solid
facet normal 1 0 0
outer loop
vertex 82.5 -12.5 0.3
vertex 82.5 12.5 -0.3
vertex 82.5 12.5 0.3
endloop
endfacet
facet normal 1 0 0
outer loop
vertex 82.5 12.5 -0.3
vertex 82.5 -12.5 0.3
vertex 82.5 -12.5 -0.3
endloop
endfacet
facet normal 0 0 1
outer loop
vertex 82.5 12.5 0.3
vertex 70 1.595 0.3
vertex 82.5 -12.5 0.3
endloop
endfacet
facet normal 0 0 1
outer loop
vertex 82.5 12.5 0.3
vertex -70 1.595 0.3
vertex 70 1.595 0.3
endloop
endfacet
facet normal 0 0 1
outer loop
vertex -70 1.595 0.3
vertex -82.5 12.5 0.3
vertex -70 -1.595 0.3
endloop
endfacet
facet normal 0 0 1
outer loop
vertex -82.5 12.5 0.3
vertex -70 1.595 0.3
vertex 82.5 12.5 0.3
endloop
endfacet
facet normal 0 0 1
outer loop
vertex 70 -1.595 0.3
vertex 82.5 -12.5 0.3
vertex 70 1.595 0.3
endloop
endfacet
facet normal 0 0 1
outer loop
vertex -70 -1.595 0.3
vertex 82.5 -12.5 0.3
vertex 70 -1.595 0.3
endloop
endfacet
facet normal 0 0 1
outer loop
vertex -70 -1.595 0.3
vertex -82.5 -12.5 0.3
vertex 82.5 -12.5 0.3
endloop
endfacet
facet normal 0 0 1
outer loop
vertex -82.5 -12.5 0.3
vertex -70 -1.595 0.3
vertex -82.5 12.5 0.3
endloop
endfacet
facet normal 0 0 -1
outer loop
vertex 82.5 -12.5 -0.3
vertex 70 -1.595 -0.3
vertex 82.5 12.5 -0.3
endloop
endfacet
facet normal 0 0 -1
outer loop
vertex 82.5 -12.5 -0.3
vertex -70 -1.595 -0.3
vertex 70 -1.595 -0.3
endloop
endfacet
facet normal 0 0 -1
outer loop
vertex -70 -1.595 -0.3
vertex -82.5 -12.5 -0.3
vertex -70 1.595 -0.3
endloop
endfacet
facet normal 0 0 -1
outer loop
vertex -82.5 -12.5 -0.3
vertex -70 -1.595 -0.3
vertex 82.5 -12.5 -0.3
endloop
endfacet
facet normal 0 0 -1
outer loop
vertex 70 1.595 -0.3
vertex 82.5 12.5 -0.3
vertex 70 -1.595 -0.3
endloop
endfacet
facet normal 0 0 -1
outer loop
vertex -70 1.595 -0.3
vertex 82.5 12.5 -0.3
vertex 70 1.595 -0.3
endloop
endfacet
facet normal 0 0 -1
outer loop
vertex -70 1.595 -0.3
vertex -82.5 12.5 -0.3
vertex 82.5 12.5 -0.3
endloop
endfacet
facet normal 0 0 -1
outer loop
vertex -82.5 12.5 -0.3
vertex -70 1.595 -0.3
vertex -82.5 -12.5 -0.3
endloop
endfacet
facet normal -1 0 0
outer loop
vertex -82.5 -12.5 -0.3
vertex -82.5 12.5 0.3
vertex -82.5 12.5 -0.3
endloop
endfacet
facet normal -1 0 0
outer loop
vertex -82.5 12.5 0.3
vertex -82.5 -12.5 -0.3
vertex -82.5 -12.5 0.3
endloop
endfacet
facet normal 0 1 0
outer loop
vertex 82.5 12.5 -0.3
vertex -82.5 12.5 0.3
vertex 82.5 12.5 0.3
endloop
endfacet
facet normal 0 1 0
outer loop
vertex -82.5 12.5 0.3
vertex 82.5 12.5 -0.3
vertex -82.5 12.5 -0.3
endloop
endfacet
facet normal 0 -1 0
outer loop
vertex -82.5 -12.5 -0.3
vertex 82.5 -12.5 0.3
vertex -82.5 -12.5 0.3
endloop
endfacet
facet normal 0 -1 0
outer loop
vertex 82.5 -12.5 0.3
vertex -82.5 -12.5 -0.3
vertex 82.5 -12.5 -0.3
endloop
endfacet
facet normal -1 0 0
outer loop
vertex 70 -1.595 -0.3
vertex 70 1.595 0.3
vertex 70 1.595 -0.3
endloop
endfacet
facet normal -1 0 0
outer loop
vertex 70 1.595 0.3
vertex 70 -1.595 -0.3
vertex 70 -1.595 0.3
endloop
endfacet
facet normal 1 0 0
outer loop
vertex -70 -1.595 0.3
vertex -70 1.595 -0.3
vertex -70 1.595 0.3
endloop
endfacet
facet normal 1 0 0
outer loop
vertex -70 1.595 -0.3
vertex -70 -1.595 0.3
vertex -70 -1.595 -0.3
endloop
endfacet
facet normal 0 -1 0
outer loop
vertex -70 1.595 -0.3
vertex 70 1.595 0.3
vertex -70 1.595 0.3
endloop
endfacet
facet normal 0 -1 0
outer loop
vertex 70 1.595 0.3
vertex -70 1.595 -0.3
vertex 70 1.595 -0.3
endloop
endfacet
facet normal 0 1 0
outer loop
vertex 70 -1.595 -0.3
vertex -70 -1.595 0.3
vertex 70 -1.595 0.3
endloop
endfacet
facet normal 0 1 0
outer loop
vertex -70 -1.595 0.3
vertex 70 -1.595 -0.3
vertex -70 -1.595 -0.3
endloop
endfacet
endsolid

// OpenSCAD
difference() {
  cube([165,25,0.6],center=true);
  cube([140,3.19,1],center=true);
}
